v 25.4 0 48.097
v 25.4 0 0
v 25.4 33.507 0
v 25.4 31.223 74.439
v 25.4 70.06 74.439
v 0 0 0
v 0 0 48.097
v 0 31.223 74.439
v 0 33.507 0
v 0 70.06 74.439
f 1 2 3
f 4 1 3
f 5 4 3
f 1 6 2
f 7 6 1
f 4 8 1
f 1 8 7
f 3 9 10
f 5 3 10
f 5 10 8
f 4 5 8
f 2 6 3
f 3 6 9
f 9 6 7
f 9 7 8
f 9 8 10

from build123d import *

# Parameters (mm, degrees)
F0_W     = 33.5071906447
F0_H     = 48.0974167585
F1_DEPTH = 25.4


with BuildPart() as f1:
    # F0 (on Right) → F1 (new body)
    with BuildSketch(Plane.YZ):
        Polygon((31.2226135284, 74.4392722845), (0, 48.0974167585), (33.5071906447, 48.0974167585), align=None)
        Polygon((31.2226135284, 74.4392722845), (33.5071906447, 48.0974167585), (70.0604990125, 74.4392722845), align=None)
        Polygon((33.5071906447, 48.0974167585), (33.5071906447, 0), (70.0604990125, 74.4392722845), align=None)
        with Locations((16.7535953224, 24.0487083793)):
            Rectangle(F0_W, F0_H)
    extrude(amount=F1_DEPTH)


solid = f1.part
